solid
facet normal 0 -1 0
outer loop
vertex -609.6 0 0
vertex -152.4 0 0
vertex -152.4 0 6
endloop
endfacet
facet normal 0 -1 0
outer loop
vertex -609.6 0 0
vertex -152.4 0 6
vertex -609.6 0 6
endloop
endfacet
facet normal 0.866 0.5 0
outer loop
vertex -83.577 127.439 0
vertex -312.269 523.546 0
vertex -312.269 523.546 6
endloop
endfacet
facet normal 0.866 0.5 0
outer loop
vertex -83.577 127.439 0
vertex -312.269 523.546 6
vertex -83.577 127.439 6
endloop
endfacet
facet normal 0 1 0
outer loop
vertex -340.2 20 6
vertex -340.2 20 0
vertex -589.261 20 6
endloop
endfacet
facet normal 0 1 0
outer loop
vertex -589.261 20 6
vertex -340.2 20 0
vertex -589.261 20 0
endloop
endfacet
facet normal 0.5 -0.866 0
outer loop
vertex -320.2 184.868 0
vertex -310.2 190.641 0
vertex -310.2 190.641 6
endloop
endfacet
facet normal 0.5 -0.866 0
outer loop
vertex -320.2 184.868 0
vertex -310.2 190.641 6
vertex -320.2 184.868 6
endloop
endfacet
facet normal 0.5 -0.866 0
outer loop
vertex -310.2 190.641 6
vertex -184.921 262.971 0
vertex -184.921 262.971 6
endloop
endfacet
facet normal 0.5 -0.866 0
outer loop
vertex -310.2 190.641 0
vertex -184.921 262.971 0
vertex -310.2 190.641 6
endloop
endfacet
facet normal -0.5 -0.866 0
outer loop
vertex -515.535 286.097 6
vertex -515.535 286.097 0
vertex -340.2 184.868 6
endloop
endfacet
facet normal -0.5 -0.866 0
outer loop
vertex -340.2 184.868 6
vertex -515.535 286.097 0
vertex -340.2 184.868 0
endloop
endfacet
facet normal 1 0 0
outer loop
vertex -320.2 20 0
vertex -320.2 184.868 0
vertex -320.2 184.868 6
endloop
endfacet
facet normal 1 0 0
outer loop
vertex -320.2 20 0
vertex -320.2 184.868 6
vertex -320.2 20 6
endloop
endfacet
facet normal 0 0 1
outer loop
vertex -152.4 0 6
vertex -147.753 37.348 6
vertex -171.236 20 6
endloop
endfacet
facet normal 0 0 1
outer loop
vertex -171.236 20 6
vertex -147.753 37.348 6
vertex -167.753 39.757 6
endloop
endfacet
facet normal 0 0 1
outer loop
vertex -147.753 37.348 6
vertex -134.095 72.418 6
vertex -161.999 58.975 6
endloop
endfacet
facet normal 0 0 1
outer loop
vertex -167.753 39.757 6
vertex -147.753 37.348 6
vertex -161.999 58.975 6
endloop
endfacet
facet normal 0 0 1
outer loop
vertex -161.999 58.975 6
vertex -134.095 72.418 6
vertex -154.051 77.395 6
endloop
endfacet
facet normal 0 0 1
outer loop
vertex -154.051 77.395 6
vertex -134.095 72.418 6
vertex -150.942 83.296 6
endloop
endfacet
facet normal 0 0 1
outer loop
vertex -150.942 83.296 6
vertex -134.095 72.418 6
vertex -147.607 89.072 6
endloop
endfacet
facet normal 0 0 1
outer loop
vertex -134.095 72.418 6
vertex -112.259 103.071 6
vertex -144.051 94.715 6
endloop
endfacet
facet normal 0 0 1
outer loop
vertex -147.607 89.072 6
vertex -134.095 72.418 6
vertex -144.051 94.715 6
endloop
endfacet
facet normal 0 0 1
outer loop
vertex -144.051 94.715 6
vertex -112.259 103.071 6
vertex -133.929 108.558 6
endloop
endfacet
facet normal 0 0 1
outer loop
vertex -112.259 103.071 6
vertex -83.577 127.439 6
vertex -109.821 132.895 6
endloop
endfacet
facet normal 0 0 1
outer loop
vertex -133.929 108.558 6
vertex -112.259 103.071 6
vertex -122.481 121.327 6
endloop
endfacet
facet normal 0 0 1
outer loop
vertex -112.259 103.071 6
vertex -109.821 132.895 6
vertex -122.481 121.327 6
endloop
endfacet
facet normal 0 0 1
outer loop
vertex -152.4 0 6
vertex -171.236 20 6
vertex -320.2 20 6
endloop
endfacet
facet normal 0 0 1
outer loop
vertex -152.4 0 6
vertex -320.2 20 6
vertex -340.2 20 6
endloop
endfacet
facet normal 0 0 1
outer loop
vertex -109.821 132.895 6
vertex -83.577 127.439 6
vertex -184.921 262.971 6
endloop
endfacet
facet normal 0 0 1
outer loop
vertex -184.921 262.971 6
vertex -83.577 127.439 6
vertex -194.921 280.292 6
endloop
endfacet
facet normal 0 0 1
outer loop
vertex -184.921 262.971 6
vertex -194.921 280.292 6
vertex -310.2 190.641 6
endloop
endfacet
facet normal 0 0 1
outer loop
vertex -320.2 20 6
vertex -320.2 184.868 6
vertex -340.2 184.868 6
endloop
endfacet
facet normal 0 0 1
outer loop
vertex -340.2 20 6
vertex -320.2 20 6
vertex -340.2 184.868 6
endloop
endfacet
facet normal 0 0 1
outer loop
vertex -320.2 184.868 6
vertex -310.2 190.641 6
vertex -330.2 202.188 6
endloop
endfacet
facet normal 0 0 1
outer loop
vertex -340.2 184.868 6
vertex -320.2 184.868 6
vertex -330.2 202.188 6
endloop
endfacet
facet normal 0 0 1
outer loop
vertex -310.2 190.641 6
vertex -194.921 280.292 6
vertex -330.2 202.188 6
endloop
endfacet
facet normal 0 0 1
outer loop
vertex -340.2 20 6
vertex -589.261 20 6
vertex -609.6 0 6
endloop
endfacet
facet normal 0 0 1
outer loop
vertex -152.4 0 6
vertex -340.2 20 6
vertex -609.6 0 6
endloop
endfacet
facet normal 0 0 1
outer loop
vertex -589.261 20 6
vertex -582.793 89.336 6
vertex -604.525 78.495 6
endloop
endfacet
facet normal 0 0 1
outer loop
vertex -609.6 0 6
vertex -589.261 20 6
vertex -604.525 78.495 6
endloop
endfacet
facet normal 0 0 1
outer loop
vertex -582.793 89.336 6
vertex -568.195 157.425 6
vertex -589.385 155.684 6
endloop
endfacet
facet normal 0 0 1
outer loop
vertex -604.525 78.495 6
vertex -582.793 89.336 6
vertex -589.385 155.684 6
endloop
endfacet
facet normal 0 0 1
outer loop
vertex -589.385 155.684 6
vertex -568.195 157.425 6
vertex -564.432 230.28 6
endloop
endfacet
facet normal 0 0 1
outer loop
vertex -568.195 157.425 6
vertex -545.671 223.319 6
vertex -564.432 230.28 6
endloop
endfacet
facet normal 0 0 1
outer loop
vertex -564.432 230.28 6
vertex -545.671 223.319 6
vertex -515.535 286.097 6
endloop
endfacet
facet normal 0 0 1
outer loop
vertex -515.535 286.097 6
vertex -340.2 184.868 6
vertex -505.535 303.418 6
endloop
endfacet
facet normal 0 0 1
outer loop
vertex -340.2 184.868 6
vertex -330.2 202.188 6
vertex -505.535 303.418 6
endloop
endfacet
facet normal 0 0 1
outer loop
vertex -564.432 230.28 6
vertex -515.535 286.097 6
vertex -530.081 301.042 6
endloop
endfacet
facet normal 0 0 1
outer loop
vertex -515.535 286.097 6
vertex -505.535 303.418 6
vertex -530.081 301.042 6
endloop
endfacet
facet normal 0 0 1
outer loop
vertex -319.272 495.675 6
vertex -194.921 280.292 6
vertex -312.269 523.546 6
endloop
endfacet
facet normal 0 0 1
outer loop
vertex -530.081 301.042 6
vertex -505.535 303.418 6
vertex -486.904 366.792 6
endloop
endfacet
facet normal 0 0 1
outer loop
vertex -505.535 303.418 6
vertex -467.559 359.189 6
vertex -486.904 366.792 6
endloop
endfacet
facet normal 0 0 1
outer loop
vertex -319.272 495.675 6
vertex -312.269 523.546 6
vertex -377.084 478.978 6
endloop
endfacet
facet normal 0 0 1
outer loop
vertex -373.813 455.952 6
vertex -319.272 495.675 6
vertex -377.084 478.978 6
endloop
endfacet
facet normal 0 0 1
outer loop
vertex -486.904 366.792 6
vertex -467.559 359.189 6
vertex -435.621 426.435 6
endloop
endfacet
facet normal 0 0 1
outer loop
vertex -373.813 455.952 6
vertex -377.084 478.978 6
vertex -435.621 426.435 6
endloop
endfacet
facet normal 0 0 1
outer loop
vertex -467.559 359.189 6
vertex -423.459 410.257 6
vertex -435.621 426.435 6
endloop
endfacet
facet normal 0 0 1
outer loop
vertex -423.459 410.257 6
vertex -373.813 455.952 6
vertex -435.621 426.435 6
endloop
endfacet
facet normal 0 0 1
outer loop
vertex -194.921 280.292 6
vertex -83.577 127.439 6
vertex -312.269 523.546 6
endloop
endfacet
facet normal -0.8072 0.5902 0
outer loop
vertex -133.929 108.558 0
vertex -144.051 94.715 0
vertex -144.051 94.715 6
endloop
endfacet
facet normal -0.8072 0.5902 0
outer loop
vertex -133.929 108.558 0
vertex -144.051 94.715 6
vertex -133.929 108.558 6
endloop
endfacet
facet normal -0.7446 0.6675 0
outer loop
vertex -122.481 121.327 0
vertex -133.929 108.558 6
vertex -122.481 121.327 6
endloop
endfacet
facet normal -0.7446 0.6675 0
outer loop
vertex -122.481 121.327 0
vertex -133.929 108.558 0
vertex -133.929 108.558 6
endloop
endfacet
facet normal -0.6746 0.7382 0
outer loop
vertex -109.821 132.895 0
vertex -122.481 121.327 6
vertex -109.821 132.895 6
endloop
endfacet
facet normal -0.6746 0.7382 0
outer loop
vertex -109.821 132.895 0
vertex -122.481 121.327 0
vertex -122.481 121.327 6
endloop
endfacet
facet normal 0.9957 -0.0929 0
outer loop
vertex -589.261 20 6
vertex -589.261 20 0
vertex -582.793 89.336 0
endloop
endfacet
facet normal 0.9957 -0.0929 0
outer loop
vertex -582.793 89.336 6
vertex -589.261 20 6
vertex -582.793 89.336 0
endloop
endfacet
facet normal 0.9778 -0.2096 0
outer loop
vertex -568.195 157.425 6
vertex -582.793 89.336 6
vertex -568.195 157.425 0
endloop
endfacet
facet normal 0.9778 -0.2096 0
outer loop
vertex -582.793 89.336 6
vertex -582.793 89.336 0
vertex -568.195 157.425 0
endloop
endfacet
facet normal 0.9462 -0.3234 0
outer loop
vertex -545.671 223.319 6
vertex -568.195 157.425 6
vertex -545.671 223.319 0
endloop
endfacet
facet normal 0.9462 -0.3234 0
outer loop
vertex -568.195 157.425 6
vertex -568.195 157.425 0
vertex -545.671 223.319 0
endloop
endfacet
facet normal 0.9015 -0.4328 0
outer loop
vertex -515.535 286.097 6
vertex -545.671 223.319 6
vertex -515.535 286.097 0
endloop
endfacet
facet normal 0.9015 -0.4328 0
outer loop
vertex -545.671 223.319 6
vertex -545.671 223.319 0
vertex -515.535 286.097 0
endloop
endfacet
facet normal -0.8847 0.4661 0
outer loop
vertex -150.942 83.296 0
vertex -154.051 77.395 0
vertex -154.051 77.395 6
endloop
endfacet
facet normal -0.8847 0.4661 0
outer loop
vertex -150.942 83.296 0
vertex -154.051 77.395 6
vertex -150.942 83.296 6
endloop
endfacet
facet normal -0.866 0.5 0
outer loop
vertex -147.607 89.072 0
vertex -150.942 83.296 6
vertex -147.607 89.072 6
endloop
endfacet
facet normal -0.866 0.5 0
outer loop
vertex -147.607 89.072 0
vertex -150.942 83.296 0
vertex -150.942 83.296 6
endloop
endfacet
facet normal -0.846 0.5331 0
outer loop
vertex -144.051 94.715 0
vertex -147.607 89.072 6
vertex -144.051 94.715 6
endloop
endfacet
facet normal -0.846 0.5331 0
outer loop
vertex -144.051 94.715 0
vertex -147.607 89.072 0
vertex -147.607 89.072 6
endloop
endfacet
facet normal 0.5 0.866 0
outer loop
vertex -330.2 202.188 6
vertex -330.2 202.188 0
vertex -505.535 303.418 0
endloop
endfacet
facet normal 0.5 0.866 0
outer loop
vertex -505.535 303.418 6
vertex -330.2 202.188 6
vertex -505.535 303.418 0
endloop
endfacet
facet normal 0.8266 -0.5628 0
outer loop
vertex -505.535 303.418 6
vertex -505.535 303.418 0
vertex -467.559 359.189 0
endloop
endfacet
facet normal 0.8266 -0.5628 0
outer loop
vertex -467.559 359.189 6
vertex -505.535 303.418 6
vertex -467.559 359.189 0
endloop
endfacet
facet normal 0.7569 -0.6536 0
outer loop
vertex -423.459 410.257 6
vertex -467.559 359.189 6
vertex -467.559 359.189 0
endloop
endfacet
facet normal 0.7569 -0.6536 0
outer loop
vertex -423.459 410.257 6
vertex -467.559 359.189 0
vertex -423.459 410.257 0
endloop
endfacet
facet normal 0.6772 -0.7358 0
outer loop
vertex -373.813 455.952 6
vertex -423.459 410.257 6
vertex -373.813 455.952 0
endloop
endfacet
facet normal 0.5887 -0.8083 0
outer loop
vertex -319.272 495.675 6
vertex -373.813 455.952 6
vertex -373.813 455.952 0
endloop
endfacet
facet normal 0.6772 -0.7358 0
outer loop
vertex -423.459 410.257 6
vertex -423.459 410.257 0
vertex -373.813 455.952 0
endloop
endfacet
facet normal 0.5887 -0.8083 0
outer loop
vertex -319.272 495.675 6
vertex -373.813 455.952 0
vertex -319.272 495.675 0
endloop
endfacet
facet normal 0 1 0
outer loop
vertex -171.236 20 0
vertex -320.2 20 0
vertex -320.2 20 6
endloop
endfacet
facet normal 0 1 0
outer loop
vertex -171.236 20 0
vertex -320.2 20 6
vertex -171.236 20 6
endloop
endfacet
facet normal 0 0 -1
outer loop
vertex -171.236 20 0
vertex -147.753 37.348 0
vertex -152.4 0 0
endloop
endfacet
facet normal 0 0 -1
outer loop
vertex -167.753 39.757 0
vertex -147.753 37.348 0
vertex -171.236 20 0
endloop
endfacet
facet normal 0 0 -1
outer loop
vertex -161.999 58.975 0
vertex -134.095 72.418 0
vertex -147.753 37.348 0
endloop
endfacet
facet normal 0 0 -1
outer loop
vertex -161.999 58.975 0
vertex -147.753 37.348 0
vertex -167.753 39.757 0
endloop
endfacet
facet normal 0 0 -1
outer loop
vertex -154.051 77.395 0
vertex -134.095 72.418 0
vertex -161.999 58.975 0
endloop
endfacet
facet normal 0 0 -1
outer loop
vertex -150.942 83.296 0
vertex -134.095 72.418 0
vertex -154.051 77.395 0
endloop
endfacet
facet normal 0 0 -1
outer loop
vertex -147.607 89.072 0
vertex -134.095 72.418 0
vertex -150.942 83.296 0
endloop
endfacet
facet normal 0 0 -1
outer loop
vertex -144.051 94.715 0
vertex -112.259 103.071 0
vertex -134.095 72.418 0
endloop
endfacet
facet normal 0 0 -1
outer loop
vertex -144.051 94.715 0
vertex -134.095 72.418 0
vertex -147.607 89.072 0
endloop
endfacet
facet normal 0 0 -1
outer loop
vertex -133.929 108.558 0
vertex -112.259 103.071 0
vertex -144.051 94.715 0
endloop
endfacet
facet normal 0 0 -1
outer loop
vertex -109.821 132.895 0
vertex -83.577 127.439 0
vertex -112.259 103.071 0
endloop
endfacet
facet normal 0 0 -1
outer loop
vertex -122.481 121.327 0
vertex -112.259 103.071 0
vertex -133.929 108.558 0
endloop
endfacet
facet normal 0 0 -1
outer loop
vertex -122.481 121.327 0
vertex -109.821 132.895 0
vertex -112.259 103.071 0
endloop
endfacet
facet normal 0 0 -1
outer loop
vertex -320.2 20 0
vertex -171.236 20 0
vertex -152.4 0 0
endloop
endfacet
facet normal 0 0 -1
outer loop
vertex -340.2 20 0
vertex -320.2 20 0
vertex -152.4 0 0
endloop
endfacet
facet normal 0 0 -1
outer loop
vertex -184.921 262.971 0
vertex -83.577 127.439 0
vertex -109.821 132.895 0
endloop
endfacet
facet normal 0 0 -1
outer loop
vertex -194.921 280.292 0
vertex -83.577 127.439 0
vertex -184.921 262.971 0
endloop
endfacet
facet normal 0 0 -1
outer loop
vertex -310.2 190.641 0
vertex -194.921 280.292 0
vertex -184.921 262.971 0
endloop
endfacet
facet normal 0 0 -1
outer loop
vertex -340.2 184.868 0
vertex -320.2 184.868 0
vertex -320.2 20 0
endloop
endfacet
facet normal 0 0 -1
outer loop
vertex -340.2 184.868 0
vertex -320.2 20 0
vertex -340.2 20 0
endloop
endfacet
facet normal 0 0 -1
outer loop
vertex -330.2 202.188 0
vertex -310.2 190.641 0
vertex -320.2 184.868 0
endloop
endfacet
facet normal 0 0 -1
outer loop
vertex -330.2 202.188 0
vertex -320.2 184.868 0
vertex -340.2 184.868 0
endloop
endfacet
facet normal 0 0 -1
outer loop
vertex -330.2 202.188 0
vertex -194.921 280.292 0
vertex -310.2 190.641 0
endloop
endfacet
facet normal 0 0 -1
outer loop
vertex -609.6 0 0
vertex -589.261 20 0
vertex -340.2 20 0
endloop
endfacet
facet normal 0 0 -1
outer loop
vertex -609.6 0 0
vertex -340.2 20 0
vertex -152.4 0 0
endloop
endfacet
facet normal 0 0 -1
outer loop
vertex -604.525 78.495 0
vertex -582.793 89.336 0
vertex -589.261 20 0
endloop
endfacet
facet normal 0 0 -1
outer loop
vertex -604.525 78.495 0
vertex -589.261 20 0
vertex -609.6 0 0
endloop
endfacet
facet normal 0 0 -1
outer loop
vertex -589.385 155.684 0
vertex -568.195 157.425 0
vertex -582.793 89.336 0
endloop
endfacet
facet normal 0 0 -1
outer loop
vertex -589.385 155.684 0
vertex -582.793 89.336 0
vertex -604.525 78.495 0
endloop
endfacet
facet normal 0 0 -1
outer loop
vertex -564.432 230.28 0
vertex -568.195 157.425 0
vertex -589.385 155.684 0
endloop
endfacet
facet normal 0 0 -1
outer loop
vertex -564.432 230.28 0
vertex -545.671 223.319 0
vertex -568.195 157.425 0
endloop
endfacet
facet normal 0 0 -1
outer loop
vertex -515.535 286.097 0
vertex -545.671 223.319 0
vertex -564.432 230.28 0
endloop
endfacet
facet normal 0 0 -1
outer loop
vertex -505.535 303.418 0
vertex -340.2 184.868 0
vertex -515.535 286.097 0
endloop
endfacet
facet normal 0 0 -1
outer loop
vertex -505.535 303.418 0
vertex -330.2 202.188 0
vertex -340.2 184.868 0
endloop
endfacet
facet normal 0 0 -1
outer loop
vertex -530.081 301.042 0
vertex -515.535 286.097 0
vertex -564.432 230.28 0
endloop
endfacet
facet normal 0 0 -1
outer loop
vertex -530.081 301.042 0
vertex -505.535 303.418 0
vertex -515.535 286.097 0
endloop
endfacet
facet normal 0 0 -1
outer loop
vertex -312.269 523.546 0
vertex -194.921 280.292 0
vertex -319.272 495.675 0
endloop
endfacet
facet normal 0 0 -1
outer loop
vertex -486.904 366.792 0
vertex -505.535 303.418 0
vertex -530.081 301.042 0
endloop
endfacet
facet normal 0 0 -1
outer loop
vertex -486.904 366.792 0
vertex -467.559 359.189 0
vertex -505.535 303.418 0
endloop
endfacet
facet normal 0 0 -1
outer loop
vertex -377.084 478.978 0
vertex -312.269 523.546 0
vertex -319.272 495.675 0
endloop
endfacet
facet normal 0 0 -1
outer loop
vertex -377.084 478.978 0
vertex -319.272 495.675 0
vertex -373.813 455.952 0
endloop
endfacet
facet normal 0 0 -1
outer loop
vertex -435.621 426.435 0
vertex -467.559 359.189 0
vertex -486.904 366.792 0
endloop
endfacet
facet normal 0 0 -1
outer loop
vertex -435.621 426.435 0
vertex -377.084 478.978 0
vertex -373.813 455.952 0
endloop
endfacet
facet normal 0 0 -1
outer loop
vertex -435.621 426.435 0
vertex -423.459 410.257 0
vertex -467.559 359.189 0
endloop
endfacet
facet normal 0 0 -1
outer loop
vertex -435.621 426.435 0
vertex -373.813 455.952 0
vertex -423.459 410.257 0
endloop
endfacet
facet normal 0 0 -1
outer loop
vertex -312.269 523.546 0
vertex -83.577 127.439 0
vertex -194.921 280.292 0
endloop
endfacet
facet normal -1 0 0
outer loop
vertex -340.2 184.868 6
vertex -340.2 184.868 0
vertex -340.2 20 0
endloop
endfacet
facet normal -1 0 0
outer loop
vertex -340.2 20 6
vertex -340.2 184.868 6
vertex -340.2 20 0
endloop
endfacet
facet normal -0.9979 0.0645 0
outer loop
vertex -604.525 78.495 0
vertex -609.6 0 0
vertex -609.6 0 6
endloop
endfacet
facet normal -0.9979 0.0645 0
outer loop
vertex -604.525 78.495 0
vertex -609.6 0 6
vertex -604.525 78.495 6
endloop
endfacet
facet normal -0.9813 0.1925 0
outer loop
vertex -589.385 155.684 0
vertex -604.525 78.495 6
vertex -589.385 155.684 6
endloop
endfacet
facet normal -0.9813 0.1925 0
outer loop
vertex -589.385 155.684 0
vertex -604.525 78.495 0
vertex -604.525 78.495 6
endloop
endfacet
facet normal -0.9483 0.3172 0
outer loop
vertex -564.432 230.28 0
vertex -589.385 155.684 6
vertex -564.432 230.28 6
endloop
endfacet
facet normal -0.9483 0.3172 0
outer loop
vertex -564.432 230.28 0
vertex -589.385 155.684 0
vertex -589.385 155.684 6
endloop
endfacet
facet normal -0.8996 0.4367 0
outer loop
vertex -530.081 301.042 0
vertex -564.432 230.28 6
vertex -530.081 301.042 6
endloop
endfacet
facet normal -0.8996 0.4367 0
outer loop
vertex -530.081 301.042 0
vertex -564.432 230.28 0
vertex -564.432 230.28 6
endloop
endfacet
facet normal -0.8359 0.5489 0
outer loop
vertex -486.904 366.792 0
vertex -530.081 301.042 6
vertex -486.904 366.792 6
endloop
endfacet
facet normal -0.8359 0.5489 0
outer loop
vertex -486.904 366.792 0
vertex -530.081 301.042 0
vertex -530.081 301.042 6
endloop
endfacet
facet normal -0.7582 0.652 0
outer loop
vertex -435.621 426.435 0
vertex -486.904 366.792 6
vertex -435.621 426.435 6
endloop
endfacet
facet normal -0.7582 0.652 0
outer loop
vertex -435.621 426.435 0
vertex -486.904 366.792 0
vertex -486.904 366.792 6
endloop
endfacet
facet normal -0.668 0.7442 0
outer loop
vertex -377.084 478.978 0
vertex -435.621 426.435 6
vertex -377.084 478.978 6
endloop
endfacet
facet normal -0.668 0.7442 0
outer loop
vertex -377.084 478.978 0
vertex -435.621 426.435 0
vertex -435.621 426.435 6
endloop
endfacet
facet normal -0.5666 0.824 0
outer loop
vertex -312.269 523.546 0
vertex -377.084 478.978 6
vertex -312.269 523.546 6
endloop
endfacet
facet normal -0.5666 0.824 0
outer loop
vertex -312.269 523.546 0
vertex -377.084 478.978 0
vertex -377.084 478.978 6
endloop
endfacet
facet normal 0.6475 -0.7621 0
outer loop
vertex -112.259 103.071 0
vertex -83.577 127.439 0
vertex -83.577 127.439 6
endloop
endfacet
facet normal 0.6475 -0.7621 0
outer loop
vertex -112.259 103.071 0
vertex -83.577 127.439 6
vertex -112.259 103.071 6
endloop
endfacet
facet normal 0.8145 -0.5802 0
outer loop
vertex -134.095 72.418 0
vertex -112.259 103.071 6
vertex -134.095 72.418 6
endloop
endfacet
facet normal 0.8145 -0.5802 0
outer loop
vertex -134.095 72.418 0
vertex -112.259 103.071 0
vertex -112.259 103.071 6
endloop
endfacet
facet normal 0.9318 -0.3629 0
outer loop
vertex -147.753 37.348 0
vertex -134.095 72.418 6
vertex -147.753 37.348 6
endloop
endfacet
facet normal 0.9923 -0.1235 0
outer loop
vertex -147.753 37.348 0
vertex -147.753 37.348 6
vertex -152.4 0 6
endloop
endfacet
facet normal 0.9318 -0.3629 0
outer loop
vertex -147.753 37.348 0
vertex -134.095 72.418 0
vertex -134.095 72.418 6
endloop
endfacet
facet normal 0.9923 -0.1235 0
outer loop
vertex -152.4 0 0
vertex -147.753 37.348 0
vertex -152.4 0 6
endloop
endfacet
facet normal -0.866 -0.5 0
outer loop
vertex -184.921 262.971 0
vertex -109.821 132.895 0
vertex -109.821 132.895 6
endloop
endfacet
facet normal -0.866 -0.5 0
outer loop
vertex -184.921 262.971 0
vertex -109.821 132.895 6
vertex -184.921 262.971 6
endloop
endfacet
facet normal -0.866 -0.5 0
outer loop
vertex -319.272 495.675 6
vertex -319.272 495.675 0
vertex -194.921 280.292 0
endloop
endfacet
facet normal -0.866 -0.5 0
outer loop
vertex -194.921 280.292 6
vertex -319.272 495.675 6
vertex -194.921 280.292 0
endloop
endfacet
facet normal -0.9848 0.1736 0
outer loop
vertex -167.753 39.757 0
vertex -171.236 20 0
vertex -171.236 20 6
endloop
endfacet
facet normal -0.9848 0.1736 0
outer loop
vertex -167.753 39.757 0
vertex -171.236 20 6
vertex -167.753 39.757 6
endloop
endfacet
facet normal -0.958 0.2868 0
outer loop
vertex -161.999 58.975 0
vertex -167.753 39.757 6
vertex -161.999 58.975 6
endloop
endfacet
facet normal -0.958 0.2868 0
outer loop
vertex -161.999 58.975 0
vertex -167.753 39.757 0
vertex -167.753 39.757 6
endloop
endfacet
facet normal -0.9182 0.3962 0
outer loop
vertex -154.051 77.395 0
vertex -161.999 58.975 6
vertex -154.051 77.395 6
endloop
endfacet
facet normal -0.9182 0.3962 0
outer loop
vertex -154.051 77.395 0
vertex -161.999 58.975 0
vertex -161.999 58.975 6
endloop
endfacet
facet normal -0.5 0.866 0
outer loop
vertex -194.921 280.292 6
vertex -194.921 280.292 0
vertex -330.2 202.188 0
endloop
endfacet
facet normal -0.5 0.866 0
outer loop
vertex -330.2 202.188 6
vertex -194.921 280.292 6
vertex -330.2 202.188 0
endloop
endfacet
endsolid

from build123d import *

# Parameters (mm, degrees)
BOSS_EXTRUDE1_DEPTH = 6


with BuildPart() as part:
    # Sketch1 → Boss-Extrude1 (new body)
    with BuildSketch(Plane.XY):
        with BuildLine():
            ThreePointArc((-83.576869021, 127.438875406), (-134.094882152, 72.417695218), (-152.4, 0))
            Line((-152.4, 0), (-609.6, 0))
            ThreePointArc((-609.6, 0), (-530.080884891, 301.042215433), (-312.269240574, 523.545682239))
            Line((-312.269240574, 523.545682239), (-83.576869021, 127.438875406))
        make_face()
        with BuildLine():
            ThreePointArc((-154.05140053, 77.394612181), (-149.302779612, 86.2), (-144.05140053, 94.715120257))
            ThreePointArc((-144.05140053, 94.715120257), (-128.363659898, 115.08488527), (-109.821022542, 132.895082707))
            Line((-109.821022542, 132.895082707), (-184.920508076, 262.971207273))
            Line((-184.920508076, 262.971207273), (-310.2, 190.641058886))
            Line((-310.2, 190.641058886), (-320.2, 184.867556195))
            Line((-320.2, 184.867556195), (-320.2, 173.320550811))
            Line((-320.2, 173.320550811), (-320.2, 20))
            Line((-320.2, 20), (-171.235977528, 20))
            ThreePointArc((-171.235977528, 20), (-165.156001883, 49.449520141), (-154.05140053, 77.394612181))
        make_face(mode=Mode.SUBTRACT)
        with BuildLine():
            Line((-340.2, 20), (-589.260689339, 20))
            ThreePointArc((-589.260689339, 20), (-568.194860877, 157.425411141), (-515.535131015, 286.097341284))
            Line((-515.535131015, 286.097341284), (-340.2, 184.867556195))
            Line((-340.2, 184.867556195), (-340.2, 20))
        make_face(mode=Mode.SUBTRACT)
        with BuildLine():
            Line((-330.2, 202.18806427), (-505.535131015, 303.41784936))
            ThreePointArc((-505.535131015, 303.41784936), (-423.458843967, 410.256952977), (-319.272010805, 495.674836073))
            Line((-319.272010805, 495.674836073), (-194.920508076, 280.291715349))
            Line((-194.920508076, 280.291715349), (-330.2, 202.18806427))
        make_face(mode=Mode.SUBTRACT)
    extrude(amount=BOSS_EXTRUDE1_DEPTH)


solid = part.part
